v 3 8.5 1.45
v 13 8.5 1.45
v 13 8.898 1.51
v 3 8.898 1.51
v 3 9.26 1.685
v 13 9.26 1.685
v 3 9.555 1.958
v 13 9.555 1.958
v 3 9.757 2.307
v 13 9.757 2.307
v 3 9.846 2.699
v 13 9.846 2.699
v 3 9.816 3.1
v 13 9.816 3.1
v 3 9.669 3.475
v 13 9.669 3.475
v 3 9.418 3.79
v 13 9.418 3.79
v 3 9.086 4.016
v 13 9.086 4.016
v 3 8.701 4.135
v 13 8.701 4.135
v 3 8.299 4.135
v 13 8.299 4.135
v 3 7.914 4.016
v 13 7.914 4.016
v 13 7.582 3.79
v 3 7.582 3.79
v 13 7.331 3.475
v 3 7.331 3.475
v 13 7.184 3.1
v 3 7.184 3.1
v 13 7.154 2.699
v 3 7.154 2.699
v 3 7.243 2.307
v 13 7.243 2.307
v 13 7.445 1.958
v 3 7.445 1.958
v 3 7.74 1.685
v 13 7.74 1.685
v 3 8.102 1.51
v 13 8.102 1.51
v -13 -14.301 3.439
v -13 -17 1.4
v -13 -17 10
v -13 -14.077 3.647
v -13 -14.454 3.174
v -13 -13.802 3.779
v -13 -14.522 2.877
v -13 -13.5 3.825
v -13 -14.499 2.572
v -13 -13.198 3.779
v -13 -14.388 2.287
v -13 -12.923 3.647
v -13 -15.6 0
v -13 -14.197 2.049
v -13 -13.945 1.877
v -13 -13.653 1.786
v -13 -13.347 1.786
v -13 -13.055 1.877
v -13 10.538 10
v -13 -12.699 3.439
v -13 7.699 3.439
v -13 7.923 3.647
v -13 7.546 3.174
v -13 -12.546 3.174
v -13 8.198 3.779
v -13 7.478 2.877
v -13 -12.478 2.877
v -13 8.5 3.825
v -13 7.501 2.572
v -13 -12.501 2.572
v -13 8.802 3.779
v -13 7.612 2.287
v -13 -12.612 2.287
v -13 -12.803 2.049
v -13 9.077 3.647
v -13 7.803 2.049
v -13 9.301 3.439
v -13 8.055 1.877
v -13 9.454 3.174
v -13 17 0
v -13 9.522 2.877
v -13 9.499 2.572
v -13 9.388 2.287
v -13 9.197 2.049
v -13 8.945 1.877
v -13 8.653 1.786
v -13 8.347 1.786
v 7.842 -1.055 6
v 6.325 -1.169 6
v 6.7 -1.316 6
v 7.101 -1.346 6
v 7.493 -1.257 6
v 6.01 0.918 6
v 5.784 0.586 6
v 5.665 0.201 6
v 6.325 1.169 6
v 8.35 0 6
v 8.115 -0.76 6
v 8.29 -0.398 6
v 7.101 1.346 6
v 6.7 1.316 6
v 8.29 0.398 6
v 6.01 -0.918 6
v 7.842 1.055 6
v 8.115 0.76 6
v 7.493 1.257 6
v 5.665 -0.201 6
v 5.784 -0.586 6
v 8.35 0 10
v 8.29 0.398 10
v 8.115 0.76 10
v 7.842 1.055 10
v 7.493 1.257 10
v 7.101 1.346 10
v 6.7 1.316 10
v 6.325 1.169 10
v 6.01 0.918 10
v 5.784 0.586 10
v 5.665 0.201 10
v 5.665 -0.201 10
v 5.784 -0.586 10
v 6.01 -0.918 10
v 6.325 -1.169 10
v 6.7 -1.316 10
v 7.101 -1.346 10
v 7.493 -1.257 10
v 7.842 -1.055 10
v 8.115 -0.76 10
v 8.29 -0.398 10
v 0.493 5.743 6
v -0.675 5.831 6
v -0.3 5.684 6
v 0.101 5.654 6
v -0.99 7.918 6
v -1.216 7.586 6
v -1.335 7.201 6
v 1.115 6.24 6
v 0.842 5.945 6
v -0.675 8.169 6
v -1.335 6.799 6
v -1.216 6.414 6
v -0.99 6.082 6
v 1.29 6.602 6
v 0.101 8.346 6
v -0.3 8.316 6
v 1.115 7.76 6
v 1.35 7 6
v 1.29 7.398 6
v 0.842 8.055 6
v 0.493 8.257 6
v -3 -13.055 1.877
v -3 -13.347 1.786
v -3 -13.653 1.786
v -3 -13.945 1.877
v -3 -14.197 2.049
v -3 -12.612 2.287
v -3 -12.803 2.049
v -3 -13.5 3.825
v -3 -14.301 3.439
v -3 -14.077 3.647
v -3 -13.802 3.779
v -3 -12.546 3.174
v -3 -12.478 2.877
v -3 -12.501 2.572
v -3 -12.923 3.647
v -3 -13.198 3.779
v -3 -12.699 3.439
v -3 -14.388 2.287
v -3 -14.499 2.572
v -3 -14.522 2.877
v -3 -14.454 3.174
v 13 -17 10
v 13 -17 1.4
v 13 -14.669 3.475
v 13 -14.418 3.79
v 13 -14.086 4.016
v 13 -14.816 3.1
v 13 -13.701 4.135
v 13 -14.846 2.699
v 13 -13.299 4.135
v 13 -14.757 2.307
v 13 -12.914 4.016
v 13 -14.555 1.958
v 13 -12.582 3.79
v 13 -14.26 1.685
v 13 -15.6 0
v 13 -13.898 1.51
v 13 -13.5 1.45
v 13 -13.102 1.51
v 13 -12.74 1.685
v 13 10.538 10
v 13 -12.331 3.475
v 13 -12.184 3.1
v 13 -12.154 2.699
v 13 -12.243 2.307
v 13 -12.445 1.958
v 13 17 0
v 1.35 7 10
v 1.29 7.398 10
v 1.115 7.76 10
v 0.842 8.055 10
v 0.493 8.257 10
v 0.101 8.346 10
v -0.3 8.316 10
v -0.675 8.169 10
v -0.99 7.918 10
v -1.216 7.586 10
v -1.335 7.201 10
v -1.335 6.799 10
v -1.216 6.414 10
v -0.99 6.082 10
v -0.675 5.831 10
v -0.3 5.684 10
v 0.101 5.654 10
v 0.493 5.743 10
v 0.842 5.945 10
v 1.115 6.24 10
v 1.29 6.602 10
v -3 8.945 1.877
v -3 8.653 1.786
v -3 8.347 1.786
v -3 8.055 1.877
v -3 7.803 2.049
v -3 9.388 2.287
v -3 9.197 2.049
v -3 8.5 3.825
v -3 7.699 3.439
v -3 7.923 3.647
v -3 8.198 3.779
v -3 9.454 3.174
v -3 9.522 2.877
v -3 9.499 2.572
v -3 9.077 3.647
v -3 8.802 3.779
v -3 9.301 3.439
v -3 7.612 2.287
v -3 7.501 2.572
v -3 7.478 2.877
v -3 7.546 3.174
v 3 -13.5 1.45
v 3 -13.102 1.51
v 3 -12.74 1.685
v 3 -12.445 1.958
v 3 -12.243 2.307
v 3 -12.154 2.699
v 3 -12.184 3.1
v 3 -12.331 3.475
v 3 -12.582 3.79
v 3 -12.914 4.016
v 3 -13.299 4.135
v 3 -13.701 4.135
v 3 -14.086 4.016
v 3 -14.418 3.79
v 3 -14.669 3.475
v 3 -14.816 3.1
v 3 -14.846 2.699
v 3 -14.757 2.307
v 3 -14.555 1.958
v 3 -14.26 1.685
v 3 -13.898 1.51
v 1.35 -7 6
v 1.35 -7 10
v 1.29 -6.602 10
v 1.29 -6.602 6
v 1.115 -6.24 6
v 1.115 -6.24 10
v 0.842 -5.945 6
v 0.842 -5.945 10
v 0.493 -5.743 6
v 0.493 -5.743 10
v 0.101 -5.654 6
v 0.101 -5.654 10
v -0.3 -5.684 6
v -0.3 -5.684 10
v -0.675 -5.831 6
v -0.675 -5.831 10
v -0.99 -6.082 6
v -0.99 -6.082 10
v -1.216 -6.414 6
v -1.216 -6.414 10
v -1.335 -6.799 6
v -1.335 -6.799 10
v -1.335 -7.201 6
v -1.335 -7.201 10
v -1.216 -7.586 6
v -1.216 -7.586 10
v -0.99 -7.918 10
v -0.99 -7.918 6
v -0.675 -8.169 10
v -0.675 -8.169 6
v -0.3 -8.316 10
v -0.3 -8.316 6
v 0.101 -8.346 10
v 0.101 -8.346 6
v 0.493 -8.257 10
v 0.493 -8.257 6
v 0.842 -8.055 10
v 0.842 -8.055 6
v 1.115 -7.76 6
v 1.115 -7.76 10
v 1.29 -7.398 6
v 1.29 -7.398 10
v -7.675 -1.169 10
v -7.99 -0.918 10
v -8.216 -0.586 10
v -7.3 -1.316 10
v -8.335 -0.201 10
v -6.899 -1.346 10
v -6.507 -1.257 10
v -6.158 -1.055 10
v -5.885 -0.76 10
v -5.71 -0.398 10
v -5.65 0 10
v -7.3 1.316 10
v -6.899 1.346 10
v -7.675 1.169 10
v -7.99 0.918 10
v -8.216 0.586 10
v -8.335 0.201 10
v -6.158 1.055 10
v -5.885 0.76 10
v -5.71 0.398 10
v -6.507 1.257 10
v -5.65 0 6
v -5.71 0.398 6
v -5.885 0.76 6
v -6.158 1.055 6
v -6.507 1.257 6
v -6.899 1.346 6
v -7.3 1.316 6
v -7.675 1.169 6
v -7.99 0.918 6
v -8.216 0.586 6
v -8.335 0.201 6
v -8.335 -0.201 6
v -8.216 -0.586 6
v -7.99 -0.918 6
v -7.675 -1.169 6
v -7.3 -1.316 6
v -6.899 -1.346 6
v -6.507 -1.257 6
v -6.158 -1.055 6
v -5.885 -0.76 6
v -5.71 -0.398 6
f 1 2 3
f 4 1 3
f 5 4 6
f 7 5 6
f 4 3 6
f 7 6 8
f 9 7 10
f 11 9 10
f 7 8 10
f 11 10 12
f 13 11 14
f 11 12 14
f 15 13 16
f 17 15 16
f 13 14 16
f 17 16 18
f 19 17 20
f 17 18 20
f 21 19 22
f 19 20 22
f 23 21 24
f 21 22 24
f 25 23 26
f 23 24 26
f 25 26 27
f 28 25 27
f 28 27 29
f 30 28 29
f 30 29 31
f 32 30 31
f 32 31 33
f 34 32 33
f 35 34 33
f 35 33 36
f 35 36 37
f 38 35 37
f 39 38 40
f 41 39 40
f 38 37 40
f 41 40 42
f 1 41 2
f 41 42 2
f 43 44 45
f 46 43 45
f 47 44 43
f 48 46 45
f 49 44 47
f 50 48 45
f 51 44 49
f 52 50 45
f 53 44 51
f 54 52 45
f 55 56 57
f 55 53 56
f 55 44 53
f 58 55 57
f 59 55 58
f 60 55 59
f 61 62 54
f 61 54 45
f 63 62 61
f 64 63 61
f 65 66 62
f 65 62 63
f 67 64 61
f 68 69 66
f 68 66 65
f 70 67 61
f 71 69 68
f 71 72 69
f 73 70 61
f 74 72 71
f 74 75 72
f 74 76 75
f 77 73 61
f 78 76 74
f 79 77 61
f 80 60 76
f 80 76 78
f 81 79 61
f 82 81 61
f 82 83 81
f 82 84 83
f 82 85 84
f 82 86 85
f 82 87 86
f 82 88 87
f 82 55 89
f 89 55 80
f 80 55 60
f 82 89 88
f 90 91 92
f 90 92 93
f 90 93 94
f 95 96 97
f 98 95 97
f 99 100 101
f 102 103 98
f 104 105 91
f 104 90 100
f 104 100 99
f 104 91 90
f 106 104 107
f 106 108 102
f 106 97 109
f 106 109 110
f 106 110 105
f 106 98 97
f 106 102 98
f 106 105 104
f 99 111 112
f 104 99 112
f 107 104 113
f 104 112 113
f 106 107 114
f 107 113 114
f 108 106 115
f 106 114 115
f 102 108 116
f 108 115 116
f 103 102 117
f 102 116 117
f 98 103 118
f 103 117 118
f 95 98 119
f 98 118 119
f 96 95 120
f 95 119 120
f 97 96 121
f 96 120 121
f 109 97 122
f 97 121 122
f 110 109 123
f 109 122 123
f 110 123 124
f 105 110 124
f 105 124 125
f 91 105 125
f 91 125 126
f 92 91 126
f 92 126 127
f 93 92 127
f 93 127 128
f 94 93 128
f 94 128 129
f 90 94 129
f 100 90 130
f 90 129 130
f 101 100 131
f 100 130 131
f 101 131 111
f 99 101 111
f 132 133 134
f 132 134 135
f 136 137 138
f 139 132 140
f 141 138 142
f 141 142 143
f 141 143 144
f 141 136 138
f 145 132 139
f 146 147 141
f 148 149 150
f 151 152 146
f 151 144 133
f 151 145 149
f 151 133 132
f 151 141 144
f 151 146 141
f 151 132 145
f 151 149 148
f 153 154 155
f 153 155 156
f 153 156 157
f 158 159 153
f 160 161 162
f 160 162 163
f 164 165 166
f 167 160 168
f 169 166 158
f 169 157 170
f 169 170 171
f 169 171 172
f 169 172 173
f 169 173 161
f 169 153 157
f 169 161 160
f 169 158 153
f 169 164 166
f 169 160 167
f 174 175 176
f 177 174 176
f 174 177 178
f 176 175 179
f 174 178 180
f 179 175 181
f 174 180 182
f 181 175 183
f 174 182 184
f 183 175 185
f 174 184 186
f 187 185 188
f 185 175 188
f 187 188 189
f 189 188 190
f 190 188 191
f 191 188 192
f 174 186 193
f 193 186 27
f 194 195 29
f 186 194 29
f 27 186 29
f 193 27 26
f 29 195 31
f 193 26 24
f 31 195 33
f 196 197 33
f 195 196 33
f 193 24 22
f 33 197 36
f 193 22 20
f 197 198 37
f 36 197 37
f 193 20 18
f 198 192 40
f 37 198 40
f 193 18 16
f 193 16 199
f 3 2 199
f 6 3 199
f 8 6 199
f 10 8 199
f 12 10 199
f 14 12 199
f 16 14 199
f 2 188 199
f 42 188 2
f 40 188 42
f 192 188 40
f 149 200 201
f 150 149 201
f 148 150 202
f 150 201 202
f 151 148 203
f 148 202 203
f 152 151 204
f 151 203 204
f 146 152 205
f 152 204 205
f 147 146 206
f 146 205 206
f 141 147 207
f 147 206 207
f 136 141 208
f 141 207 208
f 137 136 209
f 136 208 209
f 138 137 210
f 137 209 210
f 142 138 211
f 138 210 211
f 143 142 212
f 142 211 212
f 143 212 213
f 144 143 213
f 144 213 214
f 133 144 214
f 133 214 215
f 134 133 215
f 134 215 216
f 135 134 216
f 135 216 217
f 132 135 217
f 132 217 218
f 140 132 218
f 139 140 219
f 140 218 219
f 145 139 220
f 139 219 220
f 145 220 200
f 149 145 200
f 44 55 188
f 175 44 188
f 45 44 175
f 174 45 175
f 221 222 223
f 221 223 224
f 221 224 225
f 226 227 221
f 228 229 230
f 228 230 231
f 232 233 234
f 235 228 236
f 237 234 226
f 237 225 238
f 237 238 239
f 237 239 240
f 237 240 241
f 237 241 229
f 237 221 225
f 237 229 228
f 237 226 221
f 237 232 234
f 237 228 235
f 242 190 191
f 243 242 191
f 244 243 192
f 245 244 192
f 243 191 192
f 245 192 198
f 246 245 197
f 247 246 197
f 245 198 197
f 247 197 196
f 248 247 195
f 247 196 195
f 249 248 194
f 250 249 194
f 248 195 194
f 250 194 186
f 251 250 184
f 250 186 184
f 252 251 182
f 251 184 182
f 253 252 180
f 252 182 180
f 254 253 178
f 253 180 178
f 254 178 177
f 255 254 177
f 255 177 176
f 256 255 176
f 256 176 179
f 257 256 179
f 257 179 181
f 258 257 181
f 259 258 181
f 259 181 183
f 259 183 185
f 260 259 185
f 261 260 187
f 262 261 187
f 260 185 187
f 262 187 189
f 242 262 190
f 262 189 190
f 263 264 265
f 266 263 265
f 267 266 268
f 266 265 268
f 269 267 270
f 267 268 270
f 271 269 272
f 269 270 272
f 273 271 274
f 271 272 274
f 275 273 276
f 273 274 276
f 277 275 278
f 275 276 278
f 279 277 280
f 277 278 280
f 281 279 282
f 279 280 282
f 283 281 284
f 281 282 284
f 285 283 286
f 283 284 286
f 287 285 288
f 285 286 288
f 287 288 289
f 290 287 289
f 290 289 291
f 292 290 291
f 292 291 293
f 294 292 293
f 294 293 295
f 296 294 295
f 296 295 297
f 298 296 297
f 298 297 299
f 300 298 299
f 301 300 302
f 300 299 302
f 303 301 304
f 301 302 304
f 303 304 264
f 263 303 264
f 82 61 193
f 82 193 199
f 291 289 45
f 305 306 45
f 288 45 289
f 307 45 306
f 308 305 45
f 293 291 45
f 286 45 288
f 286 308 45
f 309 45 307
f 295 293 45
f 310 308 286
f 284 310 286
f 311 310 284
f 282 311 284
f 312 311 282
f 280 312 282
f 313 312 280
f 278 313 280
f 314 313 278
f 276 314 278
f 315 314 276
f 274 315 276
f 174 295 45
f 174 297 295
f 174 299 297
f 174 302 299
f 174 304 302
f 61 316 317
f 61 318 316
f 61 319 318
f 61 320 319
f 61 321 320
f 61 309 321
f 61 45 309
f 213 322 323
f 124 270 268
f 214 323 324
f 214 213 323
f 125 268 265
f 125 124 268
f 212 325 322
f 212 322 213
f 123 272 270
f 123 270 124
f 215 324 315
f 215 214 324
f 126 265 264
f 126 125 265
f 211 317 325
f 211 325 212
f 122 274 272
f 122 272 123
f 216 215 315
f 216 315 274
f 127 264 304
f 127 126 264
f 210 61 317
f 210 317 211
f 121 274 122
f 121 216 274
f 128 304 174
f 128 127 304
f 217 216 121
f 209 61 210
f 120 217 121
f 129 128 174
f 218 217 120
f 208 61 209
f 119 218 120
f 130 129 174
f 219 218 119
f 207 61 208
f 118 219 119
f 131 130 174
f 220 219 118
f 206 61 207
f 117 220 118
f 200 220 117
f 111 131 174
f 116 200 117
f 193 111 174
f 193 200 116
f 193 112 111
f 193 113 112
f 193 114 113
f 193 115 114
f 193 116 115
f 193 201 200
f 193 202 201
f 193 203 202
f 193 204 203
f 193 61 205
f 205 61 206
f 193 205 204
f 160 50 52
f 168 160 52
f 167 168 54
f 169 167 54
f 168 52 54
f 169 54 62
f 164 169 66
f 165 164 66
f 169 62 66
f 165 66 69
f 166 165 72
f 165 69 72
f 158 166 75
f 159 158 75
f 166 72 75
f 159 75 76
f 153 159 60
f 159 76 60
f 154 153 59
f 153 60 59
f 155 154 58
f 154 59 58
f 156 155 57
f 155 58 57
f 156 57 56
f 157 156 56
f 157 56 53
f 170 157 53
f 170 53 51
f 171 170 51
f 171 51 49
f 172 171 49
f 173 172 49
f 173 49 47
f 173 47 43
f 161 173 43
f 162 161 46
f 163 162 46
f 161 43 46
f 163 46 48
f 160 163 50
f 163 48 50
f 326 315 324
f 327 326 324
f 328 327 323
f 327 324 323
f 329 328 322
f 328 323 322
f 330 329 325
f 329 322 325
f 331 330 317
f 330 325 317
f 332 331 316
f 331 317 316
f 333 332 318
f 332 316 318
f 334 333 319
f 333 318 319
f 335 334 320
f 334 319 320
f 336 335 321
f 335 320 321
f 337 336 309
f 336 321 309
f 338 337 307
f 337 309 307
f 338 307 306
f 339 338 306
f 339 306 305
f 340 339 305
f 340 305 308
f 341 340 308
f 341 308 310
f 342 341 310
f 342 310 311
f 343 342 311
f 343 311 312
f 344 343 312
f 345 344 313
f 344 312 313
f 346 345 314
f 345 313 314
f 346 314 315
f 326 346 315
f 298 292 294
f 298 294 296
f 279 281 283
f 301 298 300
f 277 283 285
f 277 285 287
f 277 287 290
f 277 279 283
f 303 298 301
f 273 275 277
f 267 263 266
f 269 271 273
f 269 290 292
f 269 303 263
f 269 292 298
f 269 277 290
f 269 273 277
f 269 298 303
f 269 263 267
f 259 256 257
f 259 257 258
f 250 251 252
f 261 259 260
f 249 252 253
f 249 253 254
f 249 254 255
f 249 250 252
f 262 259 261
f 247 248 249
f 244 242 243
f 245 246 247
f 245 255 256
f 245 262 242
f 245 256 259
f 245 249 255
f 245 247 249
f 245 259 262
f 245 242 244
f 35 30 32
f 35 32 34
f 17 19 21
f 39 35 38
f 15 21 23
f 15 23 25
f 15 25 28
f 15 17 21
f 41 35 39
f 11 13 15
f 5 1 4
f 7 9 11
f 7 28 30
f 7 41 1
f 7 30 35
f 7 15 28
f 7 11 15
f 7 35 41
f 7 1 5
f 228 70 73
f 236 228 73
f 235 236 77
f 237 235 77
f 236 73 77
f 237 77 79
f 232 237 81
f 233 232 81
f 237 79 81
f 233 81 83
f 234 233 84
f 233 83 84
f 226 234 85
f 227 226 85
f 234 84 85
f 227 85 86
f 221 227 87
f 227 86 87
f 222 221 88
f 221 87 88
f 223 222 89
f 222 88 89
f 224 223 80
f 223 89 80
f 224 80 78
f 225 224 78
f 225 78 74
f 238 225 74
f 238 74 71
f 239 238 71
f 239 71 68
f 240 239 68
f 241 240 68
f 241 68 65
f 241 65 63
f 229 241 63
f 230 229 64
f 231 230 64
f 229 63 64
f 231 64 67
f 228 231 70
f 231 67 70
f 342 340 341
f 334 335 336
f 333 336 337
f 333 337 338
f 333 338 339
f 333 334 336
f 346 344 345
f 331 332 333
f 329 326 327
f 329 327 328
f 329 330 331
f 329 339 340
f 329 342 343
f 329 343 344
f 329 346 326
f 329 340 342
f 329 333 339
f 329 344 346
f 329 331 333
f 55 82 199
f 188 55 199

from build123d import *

# Parameters (mm, degrees)
ESBO_O1_W                  = 26
ESBO_O1_H                  = 34
RESSALTO_EXTRUS_O1_DEPTH   = 10
CHANFRO2_SIZE              = 1.4
CORTE_EXTRUS_O1_DEPTH      = 24.622023622
CORTE_EXTRUS_O1_DEPTH_BACK = 24.622023622
ESBO_O8_R                  = 1.35
CORTE_EXTRUS_O2_DEPTH      = 10
ESBO_O9_R                  = 1.025
CORTE_EXTRUS_O3_DEPTH      = 10
ESBO_O11_R                 = 1.35
CORTE_EXTRUS_O5_DEPTH      = 4


with BuildPart() as part:
    # Esboço1 → Ressalto-extrusão1 (new body)
    with BuildSketch(Plane.XY):
        Rectangle(ESBO_O1_W, ESBO_O1_H)
    extrude(amount=RESSALTO_EXTRUS_O1_DEPTH)

    # Chanfro2
    chanfro2_edges = [part.edges().sort_by_distance(p)[0] for p in [
        (0, -17, 0),
    ]]
    chamfer(chanfro2_edges, length=CHANFRO2_SIZE)

    # Esboço5 → Corte-extrusão1 (cut, two sides: drawn at the far end of the back side and taken through both)
    with BuildSketch(Plane(origin=(0, 0, 0), x_dir=(0, 0, -1), z_dir=(1, 0, 0)).offset(-CORTE_EXTRUS_O1_DEPTH_BACK)):
        Polygon((0, 17), (-10, 17), (-10, 10.5380702), align=None)
    extrude(amount=CORTE_EXTRUS_O1_DEPTH + CORTE_EXTRUS_O1_DEPTH_BACK, mode=Mode.SUBTRACT)

    # Esboço8 → Corte-extrusão2 (cut)
    with BuildSketch(Plane(origin=(13, 0, 0), x_dir=(0, 0, -1), z_dir=(1, 0, 0))):
        with Locations((-2.8, 8.5)):
            Circle(ESBO_O8_R)
        with Locations((-2.8, -13.5)):
            Circle(ESBO_O8_R)
    extrude(amount=-CORTE_EXTRUS_O2_DEPTH, mode=Mode.SUBTRACT)

    # Esboço9 → Corte-extrusão3 (cut)
    with BuildSketch(Plane.ZY.offset(13)):
        with Locations((2.8, 8.5)):
            Circle(ESBO_O9_R)
        with Locations((2.8, -13.5)):
            Circle(ESBO_O9_R)
    extrude(amount=-CORTE_EXTRUS_O3_DEPTH, mode=Mode.SUBTRACT)

    # Esboço11 → Corte-extrusão5 (cut)
    with BuildSketch(Plane.XY.offset(10)):
        with Locations((7, 0)):
            Circle(ESBO_O11_R)
        with Locations((0, -7)):
            Circle(ESBO_O11_R)
        with Locations((-7, 0)):
            Circle(ESBO_O11_R)
        with Locations((0, 7)):
            Circle(ESBO_O11_R)
    extrude(amount=-CORTE_EXTRUS_O5_DEPTH, mode=Mode.SUBTRACT)


solid = part.part
